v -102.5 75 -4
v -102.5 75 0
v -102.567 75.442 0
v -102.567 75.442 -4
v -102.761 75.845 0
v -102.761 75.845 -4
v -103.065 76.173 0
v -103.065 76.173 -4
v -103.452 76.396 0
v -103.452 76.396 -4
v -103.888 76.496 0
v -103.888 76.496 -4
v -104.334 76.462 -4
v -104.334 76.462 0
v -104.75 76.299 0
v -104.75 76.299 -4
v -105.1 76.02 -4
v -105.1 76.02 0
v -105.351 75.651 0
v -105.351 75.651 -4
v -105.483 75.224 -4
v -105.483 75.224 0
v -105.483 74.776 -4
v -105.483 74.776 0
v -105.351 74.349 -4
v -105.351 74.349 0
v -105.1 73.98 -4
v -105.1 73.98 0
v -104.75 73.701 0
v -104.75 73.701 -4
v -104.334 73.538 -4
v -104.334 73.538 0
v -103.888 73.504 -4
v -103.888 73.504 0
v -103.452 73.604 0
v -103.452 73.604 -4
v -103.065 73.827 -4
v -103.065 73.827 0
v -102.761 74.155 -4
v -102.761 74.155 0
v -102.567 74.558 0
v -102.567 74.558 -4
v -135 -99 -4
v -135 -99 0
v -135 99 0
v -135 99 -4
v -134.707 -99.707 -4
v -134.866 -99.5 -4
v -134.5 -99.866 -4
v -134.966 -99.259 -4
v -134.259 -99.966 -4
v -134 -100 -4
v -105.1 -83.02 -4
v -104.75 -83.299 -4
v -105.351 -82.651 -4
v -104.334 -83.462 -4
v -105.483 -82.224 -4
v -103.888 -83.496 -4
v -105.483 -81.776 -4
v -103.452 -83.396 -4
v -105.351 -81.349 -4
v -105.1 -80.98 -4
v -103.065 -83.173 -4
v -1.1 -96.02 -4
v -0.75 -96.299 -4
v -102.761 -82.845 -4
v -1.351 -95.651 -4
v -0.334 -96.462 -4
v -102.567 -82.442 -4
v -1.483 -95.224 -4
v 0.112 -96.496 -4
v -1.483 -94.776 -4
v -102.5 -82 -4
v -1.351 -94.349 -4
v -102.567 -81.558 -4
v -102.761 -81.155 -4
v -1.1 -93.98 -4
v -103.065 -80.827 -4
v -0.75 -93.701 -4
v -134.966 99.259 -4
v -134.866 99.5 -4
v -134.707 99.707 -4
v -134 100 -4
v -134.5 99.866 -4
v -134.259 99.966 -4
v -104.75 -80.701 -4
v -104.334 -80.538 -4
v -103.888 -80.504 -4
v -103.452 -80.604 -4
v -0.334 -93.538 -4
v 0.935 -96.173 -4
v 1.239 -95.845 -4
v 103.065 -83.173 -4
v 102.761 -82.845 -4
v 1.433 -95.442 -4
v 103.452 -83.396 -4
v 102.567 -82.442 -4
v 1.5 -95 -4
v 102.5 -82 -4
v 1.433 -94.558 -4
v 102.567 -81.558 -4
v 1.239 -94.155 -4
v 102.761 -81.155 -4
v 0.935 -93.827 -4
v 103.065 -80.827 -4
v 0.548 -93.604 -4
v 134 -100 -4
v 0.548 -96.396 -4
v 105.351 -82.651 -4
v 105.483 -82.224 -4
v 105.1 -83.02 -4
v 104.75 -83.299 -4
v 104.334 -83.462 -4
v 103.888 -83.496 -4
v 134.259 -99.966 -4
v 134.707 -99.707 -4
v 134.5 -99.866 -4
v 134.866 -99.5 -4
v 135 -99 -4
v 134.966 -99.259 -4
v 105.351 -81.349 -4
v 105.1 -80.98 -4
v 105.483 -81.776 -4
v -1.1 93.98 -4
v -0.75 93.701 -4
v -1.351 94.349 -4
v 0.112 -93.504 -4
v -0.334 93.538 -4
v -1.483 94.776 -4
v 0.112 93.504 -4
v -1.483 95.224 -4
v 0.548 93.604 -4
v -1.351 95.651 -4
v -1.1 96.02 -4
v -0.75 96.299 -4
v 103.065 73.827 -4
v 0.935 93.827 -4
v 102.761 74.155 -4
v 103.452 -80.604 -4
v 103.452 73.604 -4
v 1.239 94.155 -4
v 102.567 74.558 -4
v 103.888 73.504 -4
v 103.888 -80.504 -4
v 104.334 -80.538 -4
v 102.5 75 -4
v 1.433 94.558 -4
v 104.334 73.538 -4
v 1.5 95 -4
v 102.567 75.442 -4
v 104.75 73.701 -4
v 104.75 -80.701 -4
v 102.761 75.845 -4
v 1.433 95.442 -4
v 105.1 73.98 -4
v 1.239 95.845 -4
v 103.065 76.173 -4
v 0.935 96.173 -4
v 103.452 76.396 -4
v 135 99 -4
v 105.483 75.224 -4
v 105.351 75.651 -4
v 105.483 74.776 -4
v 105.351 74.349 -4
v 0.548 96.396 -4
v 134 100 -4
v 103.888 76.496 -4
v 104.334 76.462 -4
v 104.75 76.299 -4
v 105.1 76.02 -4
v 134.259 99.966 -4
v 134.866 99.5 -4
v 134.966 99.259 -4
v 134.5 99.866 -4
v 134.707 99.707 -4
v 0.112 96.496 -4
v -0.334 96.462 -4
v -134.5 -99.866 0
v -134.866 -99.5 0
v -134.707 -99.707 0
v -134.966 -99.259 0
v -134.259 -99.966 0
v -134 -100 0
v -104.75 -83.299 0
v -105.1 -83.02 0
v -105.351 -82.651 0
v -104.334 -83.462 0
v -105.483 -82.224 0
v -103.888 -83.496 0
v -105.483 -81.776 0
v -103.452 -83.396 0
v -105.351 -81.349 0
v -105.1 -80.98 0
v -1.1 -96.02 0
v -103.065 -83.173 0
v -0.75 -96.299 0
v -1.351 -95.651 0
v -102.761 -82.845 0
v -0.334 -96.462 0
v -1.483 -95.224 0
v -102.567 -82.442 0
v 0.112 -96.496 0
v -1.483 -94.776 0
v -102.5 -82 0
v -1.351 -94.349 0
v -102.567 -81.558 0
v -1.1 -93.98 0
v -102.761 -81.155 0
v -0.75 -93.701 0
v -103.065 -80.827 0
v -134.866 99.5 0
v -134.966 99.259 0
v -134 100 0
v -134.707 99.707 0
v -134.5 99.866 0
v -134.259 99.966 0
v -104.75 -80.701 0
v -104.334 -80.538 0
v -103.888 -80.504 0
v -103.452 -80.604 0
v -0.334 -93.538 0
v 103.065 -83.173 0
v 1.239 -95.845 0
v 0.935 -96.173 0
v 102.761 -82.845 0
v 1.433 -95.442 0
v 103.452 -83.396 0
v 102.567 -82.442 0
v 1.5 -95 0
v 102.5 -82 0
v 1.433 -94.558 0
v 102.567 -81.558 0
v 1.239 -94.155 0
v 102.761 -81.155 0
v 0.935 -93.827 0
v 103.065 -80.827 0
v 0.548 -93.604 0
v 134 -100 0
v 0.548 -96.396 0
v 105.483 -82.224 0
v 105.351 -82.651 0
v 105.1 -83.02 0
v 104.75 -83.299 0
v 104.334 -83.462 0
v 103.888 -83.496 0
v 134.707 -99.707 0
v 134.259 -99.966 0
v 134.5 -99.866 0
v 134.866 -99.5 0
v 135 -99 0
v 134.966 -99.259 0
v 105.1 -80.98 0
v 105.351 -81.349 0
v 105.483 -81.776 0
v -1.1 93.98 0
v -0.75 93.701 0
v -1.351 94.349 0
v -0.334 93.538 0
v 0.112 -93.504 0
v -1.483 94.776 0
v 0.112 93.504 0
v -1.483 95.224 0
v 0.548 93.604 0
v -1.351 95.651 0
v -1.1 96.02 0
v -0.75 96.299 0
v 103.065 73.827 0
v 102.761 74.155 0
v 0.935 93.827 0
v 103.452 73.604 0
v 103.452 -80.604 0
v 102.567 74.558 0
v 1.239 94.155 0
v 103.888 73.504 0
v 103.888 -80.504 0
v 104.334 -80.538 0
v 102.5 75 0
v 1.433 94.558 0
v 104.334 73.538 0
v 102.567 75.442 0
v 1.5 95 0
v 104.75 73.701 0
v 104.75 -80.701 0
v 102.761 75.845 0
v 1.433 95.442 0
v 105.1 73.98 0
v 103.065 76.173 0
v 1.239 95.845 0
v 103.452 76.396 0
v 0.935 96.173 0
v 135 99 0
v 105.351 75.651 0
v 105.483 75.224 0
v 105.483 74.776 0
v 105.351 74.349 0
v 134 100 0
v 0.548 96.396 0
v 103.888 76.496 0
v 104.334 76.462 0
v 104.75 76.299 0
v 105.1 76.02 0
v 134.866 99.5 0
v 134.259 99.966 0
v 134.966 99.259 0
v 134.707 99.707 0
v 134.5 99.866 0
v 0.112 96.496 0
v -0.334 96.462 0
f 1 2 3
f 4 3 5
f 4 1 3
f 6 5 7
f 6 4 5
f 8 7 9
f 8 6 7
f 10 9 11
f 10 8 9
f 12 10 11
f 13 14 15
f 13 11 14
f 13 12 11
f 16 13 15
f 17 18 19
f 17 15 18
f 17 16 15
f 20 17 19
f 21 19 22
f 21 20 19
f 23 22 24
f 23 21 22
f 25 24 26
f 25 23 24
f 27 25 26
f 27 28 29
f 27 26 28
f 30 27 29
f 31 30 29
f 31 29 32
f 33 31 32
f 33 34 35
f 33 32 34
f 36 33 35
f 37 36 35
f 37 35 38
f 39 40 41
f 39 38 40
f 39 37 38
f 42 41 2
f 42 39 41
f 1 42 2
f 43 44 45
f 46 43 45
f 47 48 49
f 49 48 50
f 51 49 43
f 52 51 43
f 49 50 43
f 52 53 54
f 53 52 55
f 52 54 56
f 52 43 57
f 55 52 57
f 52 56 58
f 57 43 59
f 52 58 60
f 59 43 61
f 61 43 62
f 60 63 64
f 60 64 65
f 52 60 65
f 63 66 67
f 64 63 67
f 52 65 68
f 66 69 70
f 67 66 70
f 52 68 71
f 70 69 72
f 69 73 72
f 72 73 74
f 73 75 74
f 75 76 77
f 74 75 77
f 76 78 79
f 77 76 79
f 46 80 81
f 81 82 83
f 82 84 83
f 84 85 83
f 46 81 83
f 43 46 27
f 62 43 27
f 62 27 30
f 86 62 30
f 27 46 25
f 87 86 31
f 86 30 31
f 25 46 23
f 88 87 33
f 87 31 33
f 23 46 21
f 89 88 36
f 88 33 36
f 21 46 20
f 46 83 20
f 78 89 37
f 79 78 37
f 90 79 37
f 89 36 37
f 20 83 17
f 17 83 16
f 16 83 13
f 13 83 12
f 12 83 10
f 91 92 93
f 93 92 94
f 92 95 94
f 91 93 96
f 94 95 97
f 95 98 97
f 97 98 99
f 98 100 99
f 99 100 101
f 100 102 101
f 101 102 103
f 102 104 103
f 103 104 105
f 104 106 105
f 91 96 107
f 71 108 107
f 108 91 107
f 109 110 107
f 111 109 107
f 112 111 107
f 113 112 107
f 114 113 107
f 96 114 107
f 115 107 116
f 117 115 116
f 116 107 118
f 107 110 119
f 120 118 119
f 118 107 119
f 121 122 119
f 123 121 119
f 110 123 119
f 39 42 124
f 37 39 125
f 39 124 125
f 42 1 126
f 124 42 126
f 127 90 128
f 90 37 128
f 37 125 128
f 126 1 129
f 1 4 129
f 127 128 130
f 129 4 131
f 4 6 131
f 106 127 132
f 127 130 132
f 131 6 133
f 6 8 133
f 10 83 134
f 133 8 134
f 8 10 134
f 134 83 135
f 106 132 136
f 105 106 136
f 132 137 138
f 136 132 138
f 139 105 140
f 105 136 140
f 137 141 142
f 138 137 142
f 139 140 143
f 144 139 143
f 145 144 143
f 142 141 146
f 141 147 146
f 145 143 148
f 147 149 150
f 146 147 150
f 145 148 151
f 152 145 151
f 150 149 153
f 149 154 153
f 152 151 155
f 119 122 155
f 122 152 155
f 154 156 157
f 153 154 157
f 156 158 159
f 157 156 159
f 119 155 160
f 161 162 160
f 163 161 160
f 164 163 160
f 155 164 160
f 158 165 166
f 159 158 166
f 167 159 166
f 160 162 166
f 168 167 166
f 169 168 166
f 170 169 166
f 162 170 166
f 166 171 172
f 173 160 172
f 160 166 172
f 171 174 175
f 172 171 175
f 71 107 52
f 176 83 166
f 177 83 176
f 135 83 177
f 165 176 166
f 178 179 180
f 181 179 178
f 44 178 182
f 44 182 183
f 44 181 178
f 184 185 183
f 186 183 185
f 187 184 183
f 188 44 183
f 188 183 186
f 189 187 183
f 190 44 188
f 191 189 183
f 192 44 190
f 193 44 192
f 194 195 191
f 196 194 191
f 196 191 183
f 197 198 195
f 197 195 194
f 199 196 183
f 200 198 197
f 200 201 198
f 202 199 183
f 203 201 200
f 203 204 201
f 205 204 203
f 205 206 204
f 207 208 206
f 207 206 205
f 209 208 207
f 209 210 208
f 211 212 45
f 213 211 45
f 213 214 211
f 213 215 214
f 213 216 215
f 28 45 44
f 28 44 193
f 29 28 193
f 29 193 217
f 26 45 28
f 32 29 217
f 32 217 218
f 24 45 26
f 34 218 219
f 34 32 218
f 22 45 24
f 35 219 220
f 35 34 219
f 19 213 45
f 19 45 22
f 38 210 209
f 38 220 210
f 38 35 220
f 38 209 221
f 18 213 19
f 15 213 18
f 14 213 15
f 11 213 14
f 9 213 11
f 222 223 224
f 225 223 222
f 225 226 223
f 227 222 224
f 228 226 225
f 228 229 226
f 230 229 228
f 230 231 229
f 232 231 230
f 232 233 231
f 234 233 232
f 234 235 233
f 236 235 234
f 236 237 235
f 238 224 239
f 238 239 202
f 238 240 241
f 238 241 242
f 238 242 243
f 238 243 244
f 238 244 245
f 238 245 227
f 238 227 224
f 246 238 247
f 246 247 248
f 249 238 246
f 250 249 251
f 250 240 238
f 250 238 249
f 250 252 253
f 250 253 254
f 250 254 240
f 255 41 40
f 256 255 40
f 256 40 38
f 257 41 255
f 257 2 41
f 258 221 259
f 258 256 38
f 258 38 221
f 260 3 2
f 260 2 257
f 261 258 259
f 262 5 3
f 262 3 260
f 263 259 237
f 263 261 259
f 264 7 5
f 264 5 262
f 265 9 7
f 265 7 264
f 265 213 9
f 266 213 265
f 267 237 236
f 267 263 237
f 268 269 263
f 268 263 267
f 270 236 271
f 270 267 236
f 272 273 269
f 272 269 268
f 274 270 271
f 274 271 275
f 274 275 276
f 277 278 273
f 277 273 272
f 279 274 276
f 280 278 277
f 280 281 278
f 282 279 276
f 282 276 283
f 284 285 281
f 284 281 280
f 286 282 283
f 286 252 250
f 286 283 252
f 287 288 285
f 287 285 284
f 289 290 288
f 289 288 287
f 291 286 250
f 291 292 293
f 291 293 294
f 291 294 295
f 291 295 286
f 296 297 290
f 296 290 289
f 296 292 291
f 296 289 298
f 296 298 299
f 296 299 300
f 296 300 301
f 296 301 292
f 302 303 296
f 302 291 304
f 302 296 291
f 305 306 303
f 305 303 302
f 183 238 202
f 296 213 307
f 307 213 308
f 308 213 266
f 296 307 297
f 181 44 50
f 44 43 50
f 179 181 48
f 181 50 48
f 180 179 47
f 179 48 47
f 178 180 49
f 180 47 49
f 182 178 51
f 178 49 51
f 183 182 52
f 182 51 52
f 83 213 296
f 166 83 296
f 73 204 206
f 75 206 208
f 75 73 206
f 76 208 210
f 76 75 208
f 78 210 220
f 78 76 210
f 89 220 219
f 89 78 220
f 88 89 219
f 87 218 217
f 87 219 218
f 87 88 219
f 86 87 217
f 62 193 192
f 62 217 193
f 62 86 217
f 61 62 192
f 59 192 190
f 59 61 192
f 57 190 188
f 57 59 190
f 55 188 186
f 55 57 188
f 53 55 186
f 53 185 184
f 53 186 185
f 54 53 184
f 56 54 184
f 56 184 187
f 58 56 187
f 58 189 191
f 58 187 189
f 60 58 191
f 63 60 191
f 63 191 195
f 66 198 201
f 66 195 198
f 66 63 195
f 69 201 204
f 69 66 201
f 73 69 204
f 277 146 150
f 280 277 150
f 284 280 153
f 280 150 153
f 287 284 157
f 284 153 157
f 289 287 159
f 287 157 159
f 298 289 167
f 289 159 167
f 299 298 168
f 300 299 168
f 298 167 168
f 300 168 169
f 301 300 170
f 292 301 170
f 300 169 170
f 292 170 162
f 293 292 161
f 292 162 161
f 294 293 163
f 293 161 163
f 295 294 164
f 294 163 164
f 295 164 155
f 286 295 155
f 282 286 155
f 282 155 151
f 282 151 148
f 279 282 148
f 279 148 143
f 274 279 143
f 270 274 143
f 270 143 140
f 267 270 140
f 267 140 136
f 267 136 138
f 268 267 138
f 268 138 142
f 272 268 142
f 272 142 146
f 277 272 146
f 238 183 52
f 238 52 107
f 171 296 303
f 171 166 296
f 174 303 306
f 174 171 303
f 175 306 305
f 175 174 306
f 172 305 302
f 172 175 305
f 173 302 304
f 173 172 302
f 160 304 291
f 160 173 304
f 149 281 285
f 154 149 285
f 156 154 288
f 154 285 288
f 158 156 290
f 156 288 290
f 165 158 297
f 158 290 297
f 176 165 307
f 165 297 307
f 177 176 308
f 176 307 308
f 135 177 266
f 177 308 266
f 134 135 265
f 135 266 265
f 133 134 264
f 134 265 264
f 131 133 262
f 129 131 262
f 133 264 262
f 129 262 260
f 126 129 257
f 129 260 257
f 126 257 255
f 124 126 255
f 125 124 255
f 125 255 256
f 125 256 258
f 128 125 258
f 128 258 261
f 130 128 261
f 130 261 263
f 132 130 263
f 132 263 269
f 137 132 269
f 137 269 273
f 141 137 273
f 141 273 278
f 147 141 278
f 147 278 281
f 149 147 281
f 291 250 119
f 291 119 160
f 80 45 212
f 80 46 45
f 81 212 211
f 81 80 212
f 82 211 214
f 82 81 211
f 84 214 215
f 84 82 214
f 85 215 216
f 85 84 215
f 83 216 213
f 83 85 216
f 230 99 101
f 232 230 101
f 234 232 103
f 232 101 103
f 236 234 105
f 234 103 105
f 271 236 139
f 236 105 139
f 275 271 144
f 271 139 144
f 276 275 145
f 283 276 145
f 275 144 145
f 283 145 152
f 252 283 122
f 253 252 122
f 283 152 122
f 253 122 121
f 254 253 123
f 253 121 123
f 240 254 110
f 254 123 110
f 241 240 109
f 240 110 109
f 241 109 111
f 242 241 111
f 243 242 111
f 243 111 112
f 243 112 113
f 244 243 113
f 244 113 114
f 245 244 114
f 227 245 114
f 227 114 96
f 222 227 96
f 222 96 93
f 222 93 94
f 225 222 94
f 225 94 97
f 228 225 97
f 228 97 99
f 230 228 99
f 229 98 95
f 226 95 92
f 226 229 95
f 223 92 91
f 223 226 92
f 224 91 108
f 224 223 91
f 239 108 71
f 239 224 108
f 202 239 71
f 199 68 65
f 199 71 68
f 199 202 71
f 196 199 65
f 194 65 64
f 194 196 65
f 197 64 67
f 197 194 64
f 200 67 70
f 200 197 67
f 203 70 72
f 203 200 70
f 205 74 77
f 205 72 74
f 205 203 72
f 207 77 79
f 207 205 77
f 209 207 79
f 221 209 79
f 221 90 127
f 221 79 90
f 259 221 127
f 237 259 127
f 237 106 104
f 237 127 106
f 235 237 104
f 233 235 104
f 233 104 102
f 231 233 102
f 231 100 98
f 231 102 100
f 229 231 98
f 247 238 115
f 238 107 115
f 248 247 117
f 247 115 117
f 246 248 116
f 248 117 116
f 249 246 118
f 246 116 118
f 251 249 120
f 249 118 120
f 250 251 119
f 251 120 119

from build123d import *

# Parameters (mm, degrees)
SKETCH_1_W             = 270
SKETCH_1_H             = 200
SM_BASE_FLANGE_1_DEPTH = 4
SKETCH_6_R             = 1.5
CUT_EXTRUDE_1_DEPTH    = 10
FILLET_1_R             = 1
SKETCH_7_R             = 1.5
CUT_EXTRUDE_2_DEPTH    = 10
SKETCH_8_R             = 1.5
CUT_EXTRUDE_3_DEPTH    = 10


# Sheet-metal steps are written as plain solids
with BuildPart() as part:
    # Sketch 1 → 基体-法兰1 (new body)
    with BuildSketch(Plane.XY):
        Rectangle(SKETCH_1_W, SKETCH_1_H)
    extrude(amount=-SM_BASE_FLANGE_1_DEPTH)

    # 草图6 → 切除-拉伸1 (cut)
    with BuildSketch(Plane.XY):
        with Locations((0, 95)):
            Circle(SKETCH_6_R)
    cut_extrude_1 = extrude(amount=-CUT_EXTRUDE_1_DEPTH, mode=Mode.SUBTRACT)

    # 镜向1: 切除-拉伸1 across plane
    add(cut_extrude_1.mirror(Plane.ZX), mode=Mode.SUBTRACT)

    # 圆角1
    fillet_1_edges = [part.edges().sort_by_distance(p)[0] for p in [
        (135, -100, -2),
        (-135, -100, -2),
        (-135, 100, -2),
        (135, 100, -2),
    ]]
    fillet(fillet_1_edges, radius=FILLET_1_R)

    # 草图7 → 切除-拉伸2 (cut)
    with BuildSketch(Plane(origin=(0, 0, -4), x_dir=(-1, 0, 0), z_dir=(0, 0, -1))):
        with Locations((-104, 75)):
            Circle(SKETCH_7_R)
    cut_extrude_2 = extrude(amount=-CUT_EXTRUDE_2_DEPTH, mode=Mode.SUBTRACT)

    # 镜向2: 切除-拉伸2 across plane
    add(cut_extrude_2.mirror(Plane(origin=(0, 0, 0), x_dir=(0, 0, 1), z_dir=(1, 0, 0))), mode=Mode.SUBTRACT)

    # 草图8 → 切除-拉伸3 (cut)
    with BuildSketch(Plane(origin=(0, 0, -4), x_dir=(-1, 0, 0), z_dir=(0, 0, -1))):
        with Locations((-104, -82)):
            Circle(SKETCH_8_R)
    cut_extrude_3 = extrude(amount=-CUT_EXTRUDE_3_DEPTH, mode=Mode.SUBTRACT)

    # 镜向3: 切除-拉伸3 across plane
    add(cut_extrude_3.mirror(Plane(origin=(0, 0, 0), x_dir=(0, 0, 1), z_dir=(1, 0, 0))), mode=Mode.SUBTRACT)


solid = part.part
